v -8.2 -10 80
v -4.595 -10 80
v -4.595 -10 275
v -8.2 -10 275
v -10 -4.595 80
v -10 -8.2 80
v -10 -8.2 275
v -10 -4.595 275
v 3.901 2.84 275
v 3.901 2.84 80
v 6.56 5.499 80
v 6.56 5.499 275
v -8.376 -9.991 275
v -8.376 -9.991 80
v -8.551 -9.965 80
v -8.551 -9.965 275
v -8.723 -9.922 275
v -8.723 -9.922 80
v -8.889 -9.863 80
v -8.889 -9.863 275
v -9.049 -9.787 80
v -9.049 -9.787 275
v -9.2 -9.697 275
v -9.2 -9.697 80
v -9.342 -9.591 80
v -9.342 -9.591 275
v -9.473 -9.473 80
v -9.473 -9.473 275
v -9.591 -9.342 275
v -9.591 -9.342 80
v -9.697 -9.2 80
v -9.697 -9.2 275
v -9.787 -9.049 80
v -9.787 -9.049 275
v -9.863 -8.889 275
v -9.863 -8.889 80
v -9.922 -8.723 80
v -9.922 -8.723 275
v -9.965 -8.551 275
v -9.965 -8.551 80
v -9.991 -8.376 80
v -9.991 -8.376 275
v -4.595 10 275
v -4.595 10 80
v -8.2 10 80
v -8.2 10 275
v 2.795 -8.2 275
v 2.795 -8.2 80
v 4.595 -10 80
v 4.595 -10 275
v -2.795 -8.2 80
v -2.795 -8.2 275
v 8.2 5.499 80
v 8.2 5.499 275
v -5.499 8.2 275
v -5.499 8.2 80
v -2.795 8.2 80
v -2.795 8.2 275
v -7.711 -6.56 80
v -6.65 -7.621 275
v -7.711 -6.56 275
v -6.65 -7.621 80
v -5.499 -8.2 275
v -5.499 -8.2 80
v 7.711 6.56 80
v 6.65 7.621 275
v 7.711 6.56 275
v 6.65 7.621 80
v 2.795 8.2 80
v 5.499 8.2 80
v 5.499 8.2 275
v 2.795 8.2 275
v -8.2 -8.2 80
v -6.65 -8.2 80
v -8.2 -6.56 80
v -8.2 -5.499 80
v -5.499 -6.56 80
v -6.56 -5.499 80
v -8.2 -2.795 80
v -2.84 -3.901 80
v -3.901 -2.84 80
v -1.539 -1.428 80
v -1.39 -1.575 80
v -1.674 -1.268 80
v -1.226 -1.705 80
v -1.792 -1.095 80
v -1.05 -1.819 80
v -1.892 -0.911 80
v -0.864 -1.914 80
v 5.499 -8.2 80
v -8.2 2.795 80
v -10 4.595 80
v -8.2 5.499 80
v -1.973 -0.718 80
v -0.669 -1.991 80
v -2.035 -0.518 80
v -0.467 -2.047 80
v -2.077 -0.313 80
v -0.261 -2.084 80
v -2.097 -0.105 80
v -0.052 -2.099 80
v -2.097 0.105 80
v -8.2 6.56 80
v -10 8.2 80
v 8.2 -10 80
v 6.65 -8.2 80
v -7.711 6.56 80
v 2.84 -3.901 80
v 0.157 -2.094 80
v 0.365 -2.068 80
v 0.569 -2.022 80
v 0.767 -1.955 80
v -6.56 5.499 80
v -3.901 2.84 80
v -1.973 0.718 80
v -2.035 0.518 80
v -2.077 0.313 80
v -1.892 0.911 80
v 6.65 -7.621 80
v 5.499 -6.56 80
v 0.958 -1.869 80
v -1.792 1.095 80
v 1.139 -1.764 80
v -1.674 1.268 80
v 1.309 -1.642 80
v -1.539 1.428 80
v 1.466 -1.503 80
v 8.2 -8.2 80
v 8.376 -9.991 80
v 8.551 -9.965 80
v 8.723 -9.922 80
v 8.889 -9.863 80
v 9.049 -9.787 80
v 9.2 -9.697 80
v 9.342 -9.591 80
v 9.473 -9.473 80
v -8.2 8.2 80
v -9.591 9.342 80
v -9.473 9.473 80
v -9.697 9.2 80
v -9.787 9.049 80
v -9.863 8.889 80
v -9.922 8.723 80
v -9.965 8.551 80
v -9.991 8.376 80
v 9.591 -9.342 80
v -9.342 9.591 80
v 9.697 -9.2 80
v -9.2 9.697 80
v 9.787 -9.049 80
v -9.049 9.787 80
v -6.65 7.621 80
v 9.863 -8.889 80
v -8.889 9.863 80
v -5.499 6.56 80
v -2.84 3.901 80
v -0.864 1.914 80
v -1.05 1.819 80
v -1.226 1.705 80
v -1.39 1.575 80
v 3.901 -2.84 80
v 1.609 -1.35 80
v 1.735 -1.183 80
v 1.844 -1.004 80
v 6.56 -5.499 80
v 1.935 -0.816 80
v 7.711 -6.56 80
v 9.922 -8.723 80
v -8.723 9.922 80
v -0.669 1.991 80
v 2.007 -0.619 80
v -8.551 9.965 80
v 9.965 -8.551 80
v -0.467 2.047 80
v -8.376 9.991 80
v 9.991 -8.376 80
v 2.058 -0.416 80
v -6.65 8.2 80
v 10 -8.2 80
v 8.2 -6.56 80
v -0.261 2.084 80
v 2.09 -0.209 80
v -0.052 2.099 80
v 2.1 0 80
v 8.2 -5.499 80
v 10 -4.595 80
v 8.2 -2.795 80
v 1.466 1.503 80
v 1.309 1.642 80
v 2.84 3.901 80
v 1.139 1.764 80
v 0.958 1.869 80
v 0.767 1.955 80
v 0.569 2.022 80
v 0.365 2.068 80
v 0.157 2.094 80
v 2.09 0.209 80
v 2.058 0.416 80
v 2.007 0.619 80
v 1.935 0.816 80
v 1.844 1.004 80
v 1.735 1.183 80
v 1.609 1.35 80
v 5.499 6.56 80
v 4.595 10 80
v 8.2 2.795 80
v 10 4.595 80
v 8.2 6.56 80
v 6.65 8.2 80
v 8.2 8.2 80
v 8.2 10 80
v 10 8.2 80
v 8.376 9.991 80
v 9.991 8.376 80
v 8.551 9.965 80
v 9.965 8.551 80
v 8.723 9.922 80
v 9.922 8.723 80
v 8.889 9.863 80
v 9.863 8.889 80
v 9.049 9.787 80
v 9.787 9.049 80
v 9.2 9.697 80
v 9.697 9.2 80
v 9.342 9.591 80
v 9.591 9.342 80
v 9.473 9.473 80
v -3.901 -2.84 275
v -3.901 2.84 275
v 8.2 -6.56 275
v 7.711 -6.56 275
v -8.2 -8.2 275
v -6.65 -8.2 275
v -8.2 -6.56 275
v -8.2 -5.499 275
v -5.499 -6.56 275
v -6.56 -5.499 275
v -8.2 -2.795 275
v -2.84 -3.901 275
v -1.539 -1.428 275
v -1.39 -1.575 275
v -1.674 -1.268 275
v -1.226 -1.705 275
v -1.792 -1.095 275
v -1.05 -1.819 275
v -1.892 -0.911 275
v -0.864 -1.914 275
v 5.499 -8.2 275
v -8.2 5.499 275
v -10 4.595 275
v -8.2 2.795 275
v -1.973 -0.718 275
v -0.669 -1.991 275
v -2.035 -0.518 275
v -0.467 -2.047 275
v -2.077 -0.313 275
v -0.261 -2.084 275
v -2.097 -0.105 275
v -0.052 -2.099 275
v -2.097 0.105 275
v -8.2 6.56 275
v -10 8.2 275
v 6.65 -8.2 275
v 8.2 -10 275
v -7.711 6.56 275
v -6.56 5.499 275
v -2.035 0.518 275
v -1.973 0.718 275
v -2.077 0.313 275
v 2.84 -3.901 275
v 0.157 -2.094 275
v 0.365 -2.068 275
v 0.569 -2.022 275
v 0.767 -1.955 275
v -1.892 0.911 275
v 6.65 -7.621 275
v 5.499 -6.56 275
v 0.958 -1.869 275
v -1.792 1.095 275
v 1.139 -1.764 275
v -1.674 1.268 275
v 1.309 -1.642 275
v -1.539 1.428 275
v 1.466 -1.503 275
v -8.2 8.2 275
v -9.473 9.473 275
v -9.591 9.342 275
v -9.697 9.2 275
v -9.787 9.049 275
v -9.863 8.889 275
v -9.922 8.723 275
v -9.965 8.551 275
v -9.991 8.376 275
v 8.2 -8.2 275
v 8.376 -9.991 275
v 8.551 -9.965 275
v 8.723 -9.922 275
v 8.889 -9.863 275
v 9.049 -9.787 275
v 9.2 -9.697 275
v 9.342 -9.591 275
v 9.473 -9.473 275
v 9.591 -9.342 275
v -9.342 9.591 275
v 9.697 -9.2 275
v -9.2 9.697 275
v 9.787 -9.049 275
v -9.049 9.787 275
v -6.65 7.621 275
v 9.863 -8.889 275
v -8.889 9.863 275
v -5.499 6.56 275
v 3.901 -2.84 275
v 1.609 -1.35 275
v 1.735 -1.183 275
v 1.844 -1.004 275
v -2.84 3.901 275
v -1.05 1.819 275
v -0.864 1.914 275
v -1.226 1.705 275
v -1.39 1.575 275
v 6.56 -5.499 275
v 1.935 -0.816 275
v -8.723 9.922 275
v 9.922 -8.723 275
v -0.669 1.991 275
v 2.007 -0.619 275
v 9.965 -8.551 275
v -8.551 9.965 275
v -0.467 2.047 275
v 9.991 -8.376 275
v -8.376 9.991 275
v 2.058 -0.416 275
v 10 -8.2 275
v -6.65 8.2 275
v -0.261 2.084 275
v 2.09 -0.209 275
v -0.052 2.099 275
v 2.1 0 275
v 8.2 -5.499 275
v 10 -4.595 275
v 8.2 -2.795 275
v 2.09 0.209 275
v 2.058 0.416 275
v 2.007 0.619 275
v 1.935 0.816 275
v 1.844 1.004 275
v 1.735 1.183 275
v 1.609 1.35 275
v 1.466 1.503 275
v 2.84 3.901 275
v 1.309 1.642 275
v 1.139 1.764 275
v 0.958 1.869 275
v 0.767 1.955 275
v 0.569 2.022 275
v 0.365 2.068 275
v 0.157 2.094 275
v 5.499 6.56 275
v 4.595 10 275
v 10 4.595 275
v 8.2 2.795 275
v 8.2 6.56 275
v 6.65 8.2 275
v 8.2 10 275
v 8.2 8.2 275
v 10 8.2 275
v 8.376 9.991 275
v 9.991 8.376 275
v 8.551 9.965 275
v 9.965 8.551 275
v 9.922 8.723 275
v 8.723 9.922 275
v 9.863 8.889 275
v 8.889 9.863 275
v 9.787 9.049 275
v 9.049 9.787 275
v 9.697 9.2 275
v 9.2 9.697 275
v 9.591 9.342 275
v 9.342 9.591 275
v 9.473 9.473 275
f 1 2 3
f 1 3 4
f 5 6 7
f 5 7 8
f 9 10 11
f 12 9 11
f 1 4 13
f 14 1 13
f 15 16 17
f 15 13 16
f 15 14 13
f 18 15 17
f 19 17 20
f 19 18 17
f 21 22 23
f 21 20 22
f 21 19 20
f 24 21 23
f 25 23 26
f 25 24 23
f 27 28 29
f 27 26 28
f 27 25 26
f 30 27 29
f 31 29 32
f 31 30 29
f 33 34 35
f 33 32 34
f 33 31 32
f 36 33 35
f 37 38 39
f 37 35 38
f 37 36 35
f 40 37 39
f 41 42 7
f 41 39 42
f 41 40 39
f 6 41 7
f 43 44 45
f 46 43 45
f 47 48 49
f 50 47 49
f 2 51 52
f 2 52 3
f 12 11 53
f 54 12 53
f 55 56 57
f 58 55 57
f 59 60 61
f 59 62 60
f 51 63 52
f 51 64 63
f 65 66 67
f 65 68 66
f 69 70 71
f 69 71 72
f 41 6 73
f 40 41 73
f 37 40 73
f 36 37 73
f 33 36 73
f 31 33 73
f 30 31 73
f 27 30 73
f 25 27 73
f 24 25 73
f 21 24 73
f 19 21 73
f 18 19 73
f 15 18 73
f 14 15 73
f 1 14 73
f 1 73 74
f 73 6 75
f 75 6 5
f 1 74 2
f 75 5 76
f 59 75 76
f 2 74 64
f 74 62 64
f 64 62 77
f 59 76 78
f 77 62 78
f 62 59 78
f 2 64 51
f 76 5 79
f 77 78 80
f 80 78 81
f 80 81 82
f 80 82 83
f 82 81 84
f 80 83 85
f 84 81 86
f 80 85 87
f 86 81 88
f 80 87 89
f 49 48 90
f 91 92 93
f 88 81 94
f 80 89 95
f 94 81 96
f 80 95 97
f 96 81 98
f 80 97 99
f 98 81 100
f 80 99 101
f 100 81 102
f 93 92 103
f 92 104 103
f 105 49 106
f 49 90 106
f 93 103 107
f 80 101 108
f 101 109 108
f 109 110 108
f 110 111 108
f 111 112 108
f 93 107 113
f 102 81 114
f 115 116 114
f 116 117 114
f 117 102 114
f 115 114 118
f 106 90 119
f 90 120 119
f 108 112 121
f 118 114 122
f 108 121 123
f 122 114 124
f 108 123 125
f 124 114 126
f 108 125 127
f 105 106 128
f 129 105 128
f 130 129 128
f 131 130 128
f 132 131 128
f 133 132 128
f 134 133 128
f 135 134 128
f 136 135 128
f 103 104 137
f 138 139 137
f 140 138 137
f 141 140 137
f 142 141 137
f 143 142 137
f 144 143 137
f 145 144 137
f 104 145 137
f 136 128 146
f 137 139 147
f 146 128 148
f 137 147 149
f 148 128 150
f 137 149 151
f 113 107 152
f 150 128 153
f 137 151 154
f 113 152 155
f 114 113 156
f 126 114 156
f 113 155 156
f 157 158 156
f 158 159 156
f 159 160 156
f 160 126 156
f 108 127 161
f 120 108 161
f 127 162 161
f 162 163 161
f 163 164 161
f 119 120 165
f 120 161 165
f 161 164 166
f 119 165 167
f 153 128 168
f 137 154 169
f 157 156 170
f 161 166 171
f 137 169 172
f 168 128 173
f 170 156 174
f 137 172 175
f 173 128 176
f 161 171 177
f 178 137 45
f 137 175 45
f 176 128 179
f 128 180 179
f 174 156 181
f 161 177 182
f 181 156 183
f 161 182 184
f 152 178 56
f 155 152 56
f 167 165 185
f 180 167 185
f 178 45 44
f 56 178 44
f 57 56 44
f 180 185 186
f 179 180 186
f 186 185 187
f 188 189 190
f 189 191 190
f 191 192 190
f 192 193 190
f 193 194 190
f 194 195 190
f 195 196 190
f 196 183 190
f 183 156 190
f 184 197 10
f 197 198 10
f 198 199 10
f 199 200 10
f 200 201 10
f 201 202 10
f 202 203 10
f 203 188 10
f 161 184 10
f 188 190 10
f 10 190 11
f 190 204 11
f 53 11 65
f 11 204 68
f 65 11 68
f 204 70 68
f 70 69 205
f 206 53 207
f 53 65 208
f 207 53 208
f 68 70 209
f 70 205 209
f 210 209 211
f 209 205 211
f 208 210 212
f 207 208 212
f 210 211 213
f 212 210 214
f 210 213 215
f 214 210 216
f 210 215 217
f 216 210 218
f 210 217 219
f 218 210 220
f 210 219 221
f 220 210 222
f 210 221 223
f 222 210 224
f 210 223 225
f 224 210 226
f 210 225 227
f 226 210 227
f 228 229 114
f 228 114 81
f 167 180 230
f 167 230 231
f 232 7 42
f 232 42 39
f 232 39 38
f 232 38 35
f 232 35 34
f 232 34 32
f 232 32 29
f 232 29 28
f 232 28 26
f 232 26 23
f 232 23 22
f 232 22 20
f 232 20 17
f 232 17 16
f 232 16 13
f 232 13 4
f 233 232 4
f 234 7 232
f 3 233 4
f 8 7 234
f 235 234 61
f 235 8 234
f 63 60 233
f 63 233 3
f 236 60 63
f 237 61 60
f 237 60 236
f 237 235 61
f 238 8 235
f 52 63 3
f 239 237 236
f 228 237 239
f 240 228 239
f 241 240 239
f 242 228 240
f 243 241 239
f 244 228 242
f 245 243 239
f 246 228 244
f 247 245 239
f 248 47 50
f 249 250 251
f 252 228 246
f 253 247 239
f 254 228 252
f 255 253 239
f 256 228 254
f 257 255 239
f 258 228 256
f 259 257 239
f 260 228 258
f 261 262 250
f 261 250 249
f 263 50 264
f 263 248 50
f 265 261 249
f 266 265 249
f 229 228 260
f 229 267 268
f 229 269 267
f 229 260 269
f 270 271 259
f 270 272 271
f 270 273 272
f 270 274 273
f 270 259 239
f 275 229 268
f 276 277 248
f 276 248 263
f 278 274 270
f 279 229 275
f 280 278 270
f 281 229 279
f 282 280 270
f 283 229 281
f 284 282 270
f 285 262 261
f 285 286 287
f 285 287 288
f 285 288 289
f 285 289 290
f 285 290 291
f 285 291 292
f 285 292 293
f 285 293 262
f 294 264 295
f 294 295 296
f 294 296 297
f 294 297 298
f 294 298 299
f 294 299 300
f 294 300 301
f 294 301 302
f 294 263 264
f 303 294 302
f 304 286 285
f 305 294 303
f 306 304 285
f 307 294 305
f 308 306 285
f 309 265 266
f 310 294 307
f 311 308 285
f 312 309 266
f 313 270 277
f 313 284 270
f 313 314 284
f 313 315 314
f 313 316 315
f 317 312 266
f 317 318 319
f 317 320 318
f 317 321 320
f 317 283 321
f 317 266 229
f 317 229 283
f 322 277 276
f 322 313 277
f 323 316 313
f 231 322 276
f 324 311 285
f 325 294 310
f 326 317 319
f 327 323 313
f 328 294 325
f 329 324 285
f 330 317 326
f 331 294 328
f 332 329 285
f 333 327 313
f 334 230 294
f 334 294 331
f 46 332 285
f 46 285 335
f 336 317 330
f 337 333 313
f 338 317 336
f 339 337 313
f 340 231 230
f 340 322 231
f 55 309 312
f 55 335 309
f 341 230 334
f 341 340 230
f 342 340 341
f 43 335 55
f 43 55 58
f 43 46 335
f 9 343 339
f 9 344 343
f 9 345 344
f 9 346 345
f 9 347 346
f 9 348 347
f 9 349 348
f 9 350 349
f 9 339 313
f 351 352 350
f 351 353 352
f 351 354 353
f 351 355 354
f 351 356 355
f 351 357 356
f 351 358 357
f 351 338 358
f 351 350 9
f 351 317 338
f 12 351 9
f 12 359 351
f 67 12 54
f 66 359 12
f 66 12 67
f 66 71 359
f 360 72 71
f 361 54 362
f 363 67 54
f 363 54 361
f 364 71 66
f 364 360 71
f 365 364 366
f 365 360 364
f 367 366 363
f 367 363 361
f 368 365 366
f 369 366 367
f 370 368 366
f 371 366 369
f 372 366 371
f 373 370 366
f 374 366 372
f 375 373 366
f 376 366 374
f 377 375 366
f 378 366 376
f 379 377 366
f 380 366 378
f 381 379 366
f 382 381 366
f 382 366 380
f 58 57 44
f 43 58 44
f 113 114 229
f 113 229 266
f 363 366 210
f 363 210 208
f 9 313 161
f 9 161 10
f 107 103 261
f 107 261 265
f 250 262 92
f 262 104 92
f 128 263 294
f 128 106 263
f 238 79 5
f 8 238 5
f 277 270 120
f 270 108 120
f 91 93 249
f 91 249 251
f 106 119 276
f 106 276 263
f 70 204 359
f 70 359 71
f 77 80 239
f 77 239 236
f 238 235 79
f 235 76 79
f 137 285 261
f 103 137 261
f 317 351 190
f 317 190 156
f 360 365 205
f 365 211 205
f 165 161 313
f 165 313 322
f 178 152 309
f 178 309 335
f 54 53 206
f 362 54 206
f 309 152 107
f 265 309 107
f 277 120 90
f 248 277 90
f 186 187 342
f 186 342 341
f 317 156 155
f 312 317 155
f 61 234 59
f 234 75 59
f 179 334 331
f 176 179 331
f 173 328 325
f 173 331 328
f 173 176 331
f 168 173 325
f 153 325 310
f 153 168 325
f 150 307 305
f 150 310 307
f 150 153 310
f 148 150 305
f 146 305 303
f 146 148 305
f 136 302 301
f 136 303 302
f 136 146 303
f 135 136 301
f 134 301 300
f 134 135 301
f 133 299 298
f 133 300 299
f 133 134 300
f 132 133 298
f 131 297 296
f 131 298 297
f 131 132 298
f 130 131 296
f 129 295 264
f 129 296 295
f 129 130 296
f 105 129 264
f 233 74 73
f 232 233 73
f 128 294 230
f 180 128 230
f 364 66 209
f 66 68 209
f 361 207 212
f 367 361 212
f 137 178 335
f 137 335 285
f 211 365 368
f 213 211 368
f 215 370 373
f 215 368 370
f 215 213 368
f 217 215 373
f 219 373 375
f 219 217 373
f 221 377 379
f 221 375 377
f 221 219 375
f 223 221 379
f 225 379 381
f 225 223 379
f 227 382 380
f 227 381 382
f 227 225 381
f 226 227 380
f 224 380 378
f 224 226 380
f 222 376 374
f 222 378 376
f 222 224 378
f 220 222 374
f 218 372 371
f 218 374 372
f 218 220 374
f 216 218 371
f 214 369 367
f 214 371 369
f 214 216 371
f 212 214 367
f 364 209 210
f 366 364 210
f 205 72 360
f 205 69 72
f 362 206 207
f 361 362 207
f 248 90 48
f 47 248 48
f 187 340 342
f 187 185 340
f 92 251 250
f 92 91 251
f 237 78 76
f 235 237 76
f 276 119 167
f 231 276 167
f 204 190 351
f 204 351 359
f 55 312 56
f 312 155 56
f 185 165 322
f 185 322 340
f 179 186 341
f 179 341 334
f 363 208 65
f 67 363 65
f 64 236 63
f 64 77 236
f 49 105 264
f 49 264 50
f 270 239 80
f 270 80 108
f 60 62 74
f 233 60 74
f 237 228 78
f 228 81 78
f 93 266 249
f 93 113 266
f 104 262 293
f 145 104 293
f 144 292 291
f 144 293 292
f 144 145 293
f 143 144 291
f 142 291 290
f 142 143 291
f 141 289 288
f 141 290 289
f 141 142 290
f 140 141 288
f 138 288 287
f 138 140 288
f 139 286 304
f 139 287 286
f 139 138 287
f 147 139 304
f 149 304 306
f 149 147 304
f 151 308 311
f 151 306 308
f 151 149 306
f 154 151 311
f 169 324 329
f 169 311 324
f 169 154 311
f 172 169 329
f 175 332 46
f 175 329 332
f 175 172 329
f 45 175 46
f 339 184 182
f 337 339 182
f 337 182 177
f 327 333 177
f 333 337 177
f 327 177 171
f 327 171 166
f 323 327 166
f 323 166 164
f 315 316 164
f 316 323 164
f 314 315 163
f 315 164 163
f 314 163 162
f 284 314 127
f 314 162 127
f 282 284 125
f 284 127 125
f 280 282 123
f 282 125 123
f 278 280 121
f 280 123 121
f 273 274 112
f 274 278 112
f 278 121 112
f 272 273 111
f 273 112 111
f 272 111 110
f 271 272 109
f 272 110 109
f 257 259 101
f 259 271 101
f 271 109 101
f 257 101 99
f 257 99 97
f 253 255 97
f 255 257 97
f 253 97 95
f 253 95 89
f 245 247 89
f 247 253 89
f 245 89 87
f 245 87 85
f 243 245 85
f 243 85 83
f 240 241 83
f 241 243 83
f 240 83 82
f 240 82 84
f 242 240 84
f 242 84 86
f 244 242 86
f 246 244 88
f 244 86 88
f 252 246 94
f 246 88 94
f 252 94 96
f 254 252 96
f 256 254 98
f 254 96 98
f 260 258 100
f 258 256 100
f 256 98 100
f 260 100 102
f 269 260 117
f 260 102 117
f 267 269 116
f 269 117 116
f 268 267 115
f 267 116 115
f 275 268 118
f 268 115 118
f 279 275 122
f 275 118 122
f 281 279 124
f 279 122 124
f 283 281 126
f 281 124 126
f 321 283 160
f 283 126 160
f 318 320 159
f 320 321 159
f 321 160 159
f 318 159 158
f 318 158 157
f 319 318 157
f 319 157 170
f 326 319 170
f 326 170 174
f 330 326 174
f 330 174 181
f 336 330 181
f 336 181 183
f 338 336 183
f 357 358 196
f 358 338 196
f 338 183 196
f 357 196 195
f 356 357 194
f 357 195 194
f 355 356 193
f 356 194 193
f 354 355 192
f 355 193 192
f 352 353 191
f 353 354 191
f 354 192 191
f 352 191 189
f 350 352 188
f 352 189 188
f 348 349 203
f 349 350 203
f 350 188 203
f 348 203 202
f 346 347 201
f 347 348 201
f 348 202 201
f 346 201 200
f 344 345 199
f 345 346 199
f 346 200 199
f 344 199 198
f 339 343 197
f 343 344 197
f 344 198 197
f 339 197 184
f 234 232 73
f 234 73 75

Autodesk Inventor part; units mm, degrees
ref_plane "Start Plane" through (0, 0, 80) normal (0, 0, 1) x (1, 0, 0)
ref_plane "End Plane" through (0, 0, 275) normal (0, 0, 1) x (1, 0, 0)
sketch "Sketch" plane through (0, 0, 0) normal (0, 0, 1) x (1, 0, 0)
  line L0 (10, -4.5951) -> (10, -8.2)
  line L1 (-10, -8.2) -> (-10, -4.5951)
  line L2 (-10, 10) -> (10, -10) construction
  line L3 (10, 10) -> (-10, -10) construction
  circle A0 centre (0, 0) radius 2.1
  line L4 (-2.84, -3.9007) -> (2.84, -3.9007)
  line L5 (3.9007, -2.84) -> (3.9007, 2.84)
  line L6 (2.84, 3.9007) -> (-2.84, 3.9007)
  line L7 (-3.9007, 2.84) -> (-3.9007, -2.84)
  line L8 (-3.9007, -3.9007) -> (3.9007, 3.9007) construction
  line L9 (3.9007, -3.9007) -> (-3.9007, 3.9007) construction
  line L10 (-3.9007, -2.84) -> (-2.84, -3.9007) construction
  line L11 (-2.84, -3.9007) -> (-5.4993, -6.56)
  line L12 (-5.4993, -6.56) -> (-5.4993, -8.2)
  line L13 (-5.4993, -8.2) -> (-2.7951, -8.2)
  line L14 (-2.7951, -8.2) -> (-4.5951, -10)
  line L15 (0, 0) -> (0, -3.9007) construction
  line L16 (3.9007, -2.84) -> (2.84, -3.9007) construction
  line L17 (2.84, -3.9007) -> (5.4993, -6.56)
  line L18 (5.4993, -6.56) -> (5.4993, -8.2)
  line L19 (5.4993, -8.2) -> (2.7951, -8.2)
  line L20 (2.7951, -8.2) -> (4.5951, -10)
  line L21 (-2.84, -3.9007) -> (-3.9007, -2.84) construction
  line L22 (-3.9007, -2.84) -> (-6.56, -5.4993)
  line L23 (-6.56, -5.4993) -> (-8.2, -5.4993)
  line L24 (-8.2, -5.4993) -> (-8.2, -2.7951)
  line L25 (-8.2, -2.7951) -> (-10, -4.5951)
  line L26 (3.9007, -2.84) -> (6.56, -5.4993)
  line L27 (6.56, -5.4993) -> (8.2, -5.4993)
  line L28 (8.2, -5.4993) -> (8.2, -2.7951)
  line L29 (8.2, -2.7951) -> (10, -4.5951)
  arc A1 (-10, -8.2) -> (-8.2, -10) centre (-8.2, -8.2) ccw
  arc A2 (8.2, -10) -> (10, -8.2) centre (8.2, -8.2) ccw
  line L30 (-8.2, -6.56) -> (-7.7111, -6.56)
  line L31 (-6.6505, -8.2) -> (-8.2, -8.2)
  line L32 (-8.2, -8.2) -> (-8.2, -6.56)
  line L33 (-6.6505, -7.6207) -> (-7.7111, -6.56)
  line L34 (-6.6505, -7.6207) -> (-6.6505, -8.2)
  line L35 (8.2, -6.56) -> (7.7111, -6.56)
  line L36 (6.6505, -8.2) -> (8.2, -8.2)
  line L37 (8.2, -8.2) -> (8.2, -6.56)
  line L38 (6.6505, -7.6207) -> (7.7111, -6.56)
  line L39 (6.6505, -7.6207) -> (6.6505, -8.2)
  line L40 (8.2, -10) -> (4.5951, -10)
  line L41 (-4.5951, -10) -> (-8.2, -10)
  line L42 (-3.9007, 0) -> (3.9007, 0) construction
  line L43 (10, 4.5951) -> (10, 8.2)
  line L44 (-10, 8.2) -> (-10, 4.5951)
  line L45 (-2.84, 3.9007) -> (2.84, 3.9007)
  line L46 (-3.9007, 2.84) -> (-2.84, 3.9007) construction
  line L47 (-2.84, 3.9007) -> (-5.4993, 6.56)
  line L48 (-5.4993, 6.56) -> (-5.4993, 8.2)
  line L49 (-5.4993, 8.2) -> (-2.7951, 8.2)
  line L50 (-2.7951, 8.2) -> (-4.5951, 10)
  line L51 (2.84, 3.9007) -> (5.4993, 6.56)
  line L52 (5.4993, 6.56) -> (5.4993, 8.2)
  line L53 (5.4993, 8.2) -> (2.7951, 8.2)
  line L54 (2.7951, 8.2) -> (4.5951, 10)
  line L55 (3.9007, 2.84) -> (2.84, 3.9007) construction
  line L56 (-8.2, 2.7951) -> (-10, 4.5951)
  line L57 (-2.84, 3.9007) -> (-3.9007, 2.84) construction
  line L58 (-3.9007, 2.84) -> (-6.56, 5.4993)
  line L59 (-6.56, 5.4993) -> (-8.2, 5.4993)
  line L60 (-8.2, 5.4993) -> (-8.2, 2.7951)
  line L61 (3.9007, 2.84) -> (6.56, 5.4993)
  line L62 (6.56, 5.4993) -> (8.2, 5.4993)
  line L63 (8.2, 5.4993) -> (8.2, 2.7951)
  line L64 (8.2, 2.7951) -> (10, 4.5951)
  arc A3 (-8.2, 10) -> (-10, 8.2) centre (-8.2, 8.2) ccw
  arc A4 (10, 8.2) -> (8.2, 10) centre (8.2, 8.2) ccw
  line L65 (-8.2, 6.56) -> (-7.7111, 6.56)
  line L66 (-6.6505, 8.2) -> (-8.2, 8.2)
  line L67 (-8.2, 8.2) -> (-8.2, 6.56)
  line L68 (-6.6505, 7.6207) -> (-7.7111, 6.56)
  line L69 (-6.6505, 7.6207) -> (-6.6505, 8.2)
  line L70 (8.2, 6.56) -> (7.7111, 6.56)
  line L71 (6.6505, 7.6207) -> (7.7111, 6.56)
  line L72 (8.2, 8.2) -> (8.2, 6.56)
  line L73 (6.6505, 7.6207) -> (6.6505, 8.2)
  line L74 (6.6505, 8.2) -> (8.2, 8.2)
  line L75 (8.2, 10) -> (4.5951, 10)
  line L76 (-4.5951, 10) -> (-8.2, 10)
  line L77 (-8.2, 10) -> (-4.5951, 10)
  line L78 (4.5951, 10) -> (8.2, 10)
  point P0 (8.2, -8.2)
  point P1 (0, 3.9007)
  point P2 (8.2, 8.2)
  dimension "Width" = 20
  dimension "Height" = 20
  dimension "d2" = 4.2
  dimension "d3" = 1.5
  dimension "d4" = 1.64
  dimension "d6" = 5.68
  dimension "d7" = 1.8
  dimension "d9" = 1.5
extrude "Body" add sketch "Sketch" along normal up to surface (195 mm away) from surface at 80
sketch "Sketch4" plane through (0, 0, 0) normal (0, 0, 1) x (1, 0, 0)
  line L0 (0, 0) -> (10, 0)
ref_plane "Work Plane4" through (0, 0, 0) normal (0, -1, 0) x (1, 0, 0)
sketch "Sketch5" plane through (0, 0, 0) normal (0, -1, 0) x (1, 0, 0)
  line L0 (-2, 80) -> (12, 80) construction
  line L1 (-2, 275) -> (12, 275) construction
  dimension "d17" = 195
ref_plane "Work Plane5" through (475, -8, 80) normal (0, 0, -1) x (-1, 0, 0)
split "Split1" plane through (475, -8, 80) removes the side toward (0, 0, -1)
equation "\"G_OFFSET_START\" = -80"
equation "\"G_OFFSET_END\" = 0"
equation "\"d12\" = -G_OFFSET_START"
equation "\"d13\" = Length + G_OFFSET_END"
equation "\"G_L\" = d17"
equation "\"Length\" = 275"
properties part number "V-slot 20 mm x 20 mm" material "Aluminum 6061"
